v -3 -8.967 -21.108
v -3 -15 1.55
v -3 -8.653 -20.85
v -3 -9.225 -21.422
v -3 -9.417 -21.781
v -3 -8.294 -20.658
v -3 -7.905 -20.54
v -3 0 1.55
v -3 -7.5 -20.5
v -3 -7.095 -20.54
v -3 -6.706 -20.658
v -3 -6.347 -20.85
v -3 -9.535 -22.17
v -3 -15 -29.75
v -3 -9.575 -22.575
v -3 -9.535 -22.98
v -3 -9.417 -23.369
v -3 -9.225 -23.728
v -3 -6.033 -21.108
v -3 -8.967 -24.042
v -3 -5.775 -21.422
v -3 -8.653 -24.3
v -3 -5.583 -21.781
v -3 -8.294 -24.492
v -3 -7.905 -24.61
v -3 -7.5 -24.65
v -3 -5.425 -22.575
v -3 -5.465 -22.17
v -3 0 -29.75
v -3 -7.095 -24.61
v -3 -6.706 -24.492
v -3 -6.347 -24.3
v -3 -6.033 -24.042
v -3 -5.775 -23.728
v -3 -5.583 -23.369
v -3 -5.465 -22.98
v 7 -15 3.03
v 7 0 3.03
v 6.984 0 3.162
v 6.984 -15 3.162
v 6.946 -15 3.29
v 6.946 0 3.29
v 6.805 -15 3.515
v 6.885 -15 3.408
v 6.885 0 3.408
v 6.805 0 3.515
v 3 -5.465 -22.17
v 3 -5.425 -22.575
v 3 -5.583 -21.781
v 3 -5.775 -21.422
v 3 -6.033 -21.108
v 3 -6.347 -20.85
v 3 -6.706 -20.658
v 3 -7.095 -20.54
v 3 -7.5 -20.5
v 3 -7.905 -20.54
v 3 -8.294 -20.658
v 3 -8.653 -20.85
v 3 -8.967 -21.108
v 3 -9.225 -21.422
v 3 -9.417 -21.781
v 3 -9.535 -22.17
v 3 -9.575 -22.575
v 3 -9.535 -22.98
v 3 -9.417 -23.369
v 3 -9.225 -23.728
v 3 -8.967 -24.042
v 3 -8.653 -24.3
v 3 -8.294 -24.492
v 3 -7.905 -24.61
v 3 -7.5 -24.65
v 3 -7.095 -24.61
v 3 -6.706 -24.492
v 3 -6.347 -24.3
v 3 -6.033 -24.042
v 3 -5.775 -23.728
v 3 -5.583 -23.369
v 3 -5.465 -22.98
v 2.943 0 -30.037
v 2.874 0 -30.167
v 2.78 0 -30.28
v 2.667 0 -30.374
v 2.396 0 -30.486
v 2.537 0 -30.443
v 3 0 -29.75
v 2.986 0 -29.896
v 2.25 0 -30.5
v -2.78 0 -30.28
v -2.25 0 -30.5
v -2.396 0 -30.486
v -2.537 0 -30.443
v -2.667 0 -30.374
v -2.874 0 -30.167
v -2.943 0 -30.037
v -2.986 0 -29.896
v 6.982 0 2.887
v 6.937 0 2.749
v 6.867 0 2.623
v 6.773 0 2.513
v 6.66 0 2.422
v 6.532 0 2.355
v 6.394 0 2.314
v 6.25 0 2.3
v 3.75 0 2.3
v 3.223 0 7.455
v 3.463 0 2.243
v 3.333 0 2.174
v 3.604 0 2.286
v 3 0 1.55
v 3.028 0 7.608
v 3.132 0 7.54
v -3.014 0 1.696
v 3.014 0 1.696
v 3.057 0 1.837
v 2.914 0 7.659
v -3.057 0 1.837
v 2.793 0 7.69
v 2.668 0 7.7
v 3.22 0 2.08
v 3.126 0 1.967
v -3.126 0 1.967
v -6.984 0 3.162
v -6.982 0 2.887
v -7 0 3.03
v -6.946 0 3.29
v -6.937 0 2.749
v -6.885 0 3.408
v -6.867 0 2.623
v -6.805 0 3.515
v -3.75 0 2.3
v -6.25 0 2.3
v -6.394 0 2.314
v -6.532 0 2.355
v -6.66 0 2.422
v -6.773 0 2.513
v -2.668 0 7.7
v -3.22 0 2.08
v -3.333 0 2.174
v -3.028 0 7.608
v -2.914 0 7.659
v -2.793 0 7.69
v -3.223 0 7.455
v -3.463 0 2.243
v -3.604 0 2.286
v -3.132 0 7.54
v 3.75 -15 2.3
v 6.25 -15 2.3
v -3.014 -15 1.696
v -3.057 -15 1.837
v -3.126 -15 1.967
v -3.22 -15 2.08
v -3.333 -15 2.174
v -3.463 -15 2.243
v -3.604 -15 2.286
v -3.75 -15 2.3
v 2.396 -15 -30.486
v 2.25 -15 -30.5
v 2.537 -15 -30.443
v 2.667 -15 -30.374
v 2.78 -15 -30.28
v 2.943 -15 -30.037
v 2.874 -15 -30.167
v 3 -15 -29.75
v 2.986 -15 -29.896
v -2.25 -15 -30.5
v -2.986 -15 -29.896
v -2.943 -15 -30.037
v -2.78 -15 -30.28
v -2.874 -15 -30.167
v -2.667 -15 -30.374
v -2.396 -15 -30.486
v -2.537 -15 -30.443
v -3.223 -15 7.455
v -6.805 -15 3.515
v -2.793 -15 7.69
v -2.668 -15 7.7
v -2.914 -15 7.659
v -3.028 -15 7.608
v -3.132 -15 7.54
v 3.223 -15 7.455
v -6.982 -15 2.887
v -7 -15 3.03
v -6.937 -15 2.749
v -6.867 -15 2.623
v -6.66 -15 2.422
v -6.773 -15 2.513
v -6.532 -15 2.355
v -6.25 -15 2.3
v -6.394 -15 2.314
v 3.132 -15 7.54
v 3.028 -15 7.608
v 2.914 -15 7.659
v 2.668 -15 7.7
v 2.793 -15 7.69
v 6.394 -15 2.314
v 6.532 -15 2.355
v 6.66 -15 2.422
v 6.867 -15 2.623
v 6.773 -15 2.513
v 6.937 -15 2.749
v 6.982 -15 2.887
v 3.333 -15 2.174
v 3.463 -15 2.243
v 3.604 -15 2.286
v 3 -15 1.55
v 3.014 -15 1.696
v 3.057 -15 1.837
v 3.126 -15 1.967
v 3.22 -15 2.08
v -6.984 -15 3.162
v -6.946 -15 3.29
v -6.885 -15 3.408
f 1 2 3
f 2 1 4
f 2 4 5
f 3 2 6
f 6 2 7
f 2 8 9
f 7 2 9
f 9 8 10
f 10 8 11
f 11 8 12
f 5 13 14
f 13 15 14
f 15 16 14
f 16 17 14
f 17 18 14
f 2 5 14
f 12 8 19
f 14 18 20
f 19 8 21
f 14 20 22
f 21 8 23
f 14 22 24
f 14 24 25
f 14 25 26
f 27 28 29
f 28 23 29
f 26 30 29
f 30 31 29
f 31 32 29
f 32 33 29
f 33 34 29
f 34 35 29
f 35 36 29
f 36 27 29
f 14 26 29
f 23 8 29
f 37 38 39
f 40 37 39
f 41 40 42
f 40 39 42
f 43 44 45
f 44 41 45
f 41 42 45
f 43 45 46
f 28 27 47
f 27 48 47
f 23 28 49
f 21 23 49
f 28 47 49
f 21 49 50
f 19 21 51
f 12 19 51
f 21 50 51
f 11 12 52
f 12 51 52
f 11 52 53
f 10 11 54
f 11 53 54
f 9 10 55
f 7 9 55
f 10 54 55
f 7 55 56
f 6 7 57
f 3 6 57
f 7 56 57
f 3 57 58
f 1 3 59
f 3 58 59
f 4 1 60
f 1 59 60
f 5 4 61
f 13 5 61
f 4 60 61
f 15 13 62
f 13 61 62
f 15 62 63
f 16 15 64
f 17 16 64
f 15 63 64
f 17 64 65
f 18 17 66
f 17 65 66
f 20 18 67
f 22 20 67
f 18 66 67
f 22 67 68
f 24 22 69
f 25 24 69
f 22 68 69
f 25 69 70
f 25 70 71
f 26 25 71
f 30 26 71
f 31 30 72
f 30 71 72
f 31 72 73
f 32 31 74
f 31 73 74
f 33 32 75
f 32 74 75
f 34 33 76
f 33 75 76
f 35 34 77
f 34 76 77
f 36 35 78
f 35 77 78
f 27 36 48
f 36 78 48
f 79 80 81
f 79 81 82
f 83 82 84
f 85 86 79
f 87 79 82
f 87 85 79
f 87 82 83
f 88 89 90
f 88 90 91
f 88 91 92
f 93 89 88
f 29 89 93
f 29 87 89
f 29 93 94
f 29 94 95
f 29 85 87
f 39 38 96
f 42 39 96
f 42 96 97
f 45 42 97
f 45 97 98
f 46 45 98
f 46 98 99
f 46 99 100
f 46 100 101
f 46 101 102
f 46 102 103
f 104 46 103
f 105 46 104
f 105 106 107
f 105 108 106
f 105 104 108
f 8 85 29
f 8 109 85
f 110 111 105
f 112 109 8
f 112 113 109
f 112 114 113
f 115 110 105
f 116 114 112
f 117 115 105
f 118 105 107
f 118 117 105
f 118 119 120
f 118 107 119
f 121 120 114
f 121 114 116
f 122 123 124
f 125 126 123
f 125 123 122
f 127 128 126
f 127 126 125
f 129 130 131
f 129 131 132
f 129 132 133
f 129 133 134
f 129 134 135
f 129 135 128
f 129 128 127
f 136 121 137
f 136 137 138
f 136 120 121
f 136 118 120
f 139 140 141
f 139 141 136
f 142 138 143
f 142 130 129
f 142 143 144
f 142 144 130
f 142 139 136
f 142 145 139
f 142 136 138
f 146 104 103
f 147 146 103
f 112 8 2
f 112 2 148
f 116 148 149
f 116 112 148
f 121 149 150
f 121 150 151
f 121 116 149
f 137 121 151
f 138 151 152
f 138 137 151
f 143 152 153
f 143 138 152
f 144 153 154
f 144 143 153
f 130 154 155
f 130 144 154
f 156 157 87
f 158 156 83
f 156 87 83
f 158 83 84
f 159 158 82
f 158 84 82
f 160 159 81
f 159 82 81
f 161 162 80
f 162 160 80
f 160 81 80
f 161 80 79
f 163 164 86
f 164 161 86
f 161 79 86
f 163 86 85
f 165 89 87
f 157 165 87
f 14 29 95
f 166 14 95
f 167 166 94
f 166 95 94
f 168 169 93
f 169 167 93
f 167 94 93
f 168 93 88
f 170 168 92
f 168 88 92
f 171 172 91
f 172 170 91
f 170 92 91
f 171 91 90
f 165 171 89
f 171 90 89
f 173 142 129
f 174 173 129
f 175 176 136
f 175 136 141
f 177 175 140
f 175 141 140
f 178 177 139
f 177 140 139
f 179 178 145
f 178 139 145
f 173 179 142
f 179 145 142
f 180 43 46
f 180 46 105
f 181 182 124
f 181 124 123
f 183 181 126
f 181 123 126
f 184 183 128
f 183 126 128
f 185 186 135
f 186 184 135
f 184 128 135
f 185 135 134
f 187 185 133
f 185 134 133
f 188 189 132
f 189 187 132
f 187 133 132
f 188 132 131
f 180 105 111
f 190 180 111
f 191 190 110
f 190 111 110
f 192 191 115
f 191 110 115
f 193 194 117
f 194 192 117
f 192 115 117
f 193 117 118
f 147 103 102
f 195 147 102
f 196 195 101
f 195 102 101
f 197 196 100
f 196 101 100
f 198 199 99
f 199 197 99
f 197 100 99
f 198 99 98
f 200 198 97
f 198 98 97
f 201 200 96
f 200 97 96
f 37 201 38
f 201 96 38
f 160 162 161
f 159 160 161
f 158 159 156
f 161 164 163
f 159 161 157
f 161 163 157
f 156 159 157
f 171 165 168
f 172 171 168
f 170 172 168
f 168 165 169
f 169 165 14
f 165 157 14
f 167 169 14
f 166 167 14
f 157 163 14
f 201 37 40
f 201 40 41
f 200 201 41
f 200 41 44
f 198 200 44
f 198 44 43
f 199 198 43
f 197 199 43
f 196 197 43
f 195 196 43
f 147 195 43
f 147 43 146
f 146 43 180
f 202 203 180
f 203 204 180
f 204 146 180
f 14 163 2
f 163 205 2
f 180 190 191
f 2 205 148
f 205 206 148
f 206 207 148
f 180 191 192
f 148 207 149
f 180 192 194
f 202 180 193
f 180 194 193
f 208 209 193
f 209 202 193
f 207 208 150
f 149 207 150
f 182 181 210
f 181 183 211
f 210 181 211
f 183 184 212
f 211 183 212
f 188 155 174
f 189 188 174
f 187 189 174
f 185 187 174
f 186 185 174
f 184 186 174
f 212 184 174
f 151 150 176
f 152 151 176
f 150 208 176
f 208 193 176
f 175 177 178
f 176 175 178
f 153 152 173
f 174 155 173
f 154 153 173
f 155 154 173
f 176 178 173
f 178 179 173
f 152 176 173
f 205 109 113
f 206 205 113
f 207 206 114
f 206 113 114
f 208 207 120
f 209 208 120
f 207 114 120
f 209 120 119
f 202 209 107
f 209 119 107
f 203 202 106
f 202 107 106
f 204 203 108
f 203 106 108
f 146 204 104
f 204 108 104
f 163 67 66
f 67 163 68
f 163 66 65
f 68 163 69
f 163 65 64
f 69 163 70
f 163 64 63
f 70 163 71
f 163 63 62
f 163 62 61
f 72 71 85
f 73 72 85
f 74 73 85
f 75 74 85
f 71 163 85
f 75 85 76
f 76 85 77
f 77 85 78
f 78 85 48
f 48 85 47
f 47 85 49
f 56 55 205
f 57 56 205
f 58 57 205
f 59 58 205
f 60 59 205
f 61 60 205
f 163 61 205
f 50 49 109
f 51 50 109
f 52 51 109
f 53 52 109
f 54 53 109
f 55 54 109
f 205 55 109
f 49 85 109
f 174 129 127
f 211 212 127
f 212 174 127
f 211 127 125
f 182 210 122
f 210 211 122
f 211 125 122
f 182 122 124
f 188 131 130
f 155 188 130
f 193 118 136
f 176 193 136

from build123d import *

# Parameters (mm, degrees)
F0_W        = 6
F0_H        = 20.5
F0_H_2      = 4
F0_H_3      = 6
F1_DEPTH    = 15
F2_T1_DEPTH = 15
F2_T3_DEPTH = 16.4497757802
F2_T5_DEPTH = 16.6588870729
F2_T7_DEPTH = 18.75
F3_R        = 2.075
F4_DEPTH    = 12.5


# Not quite as in the source:
# - a fillet or chamfer that OpenCascade refuses, or shapes differently, is made with other operations: its cross-section is extruded or revolved along the edge and cut away or added


with BuildPart() as f1:
    # F0 (on Front) → F1 (new body)
    with BuildSketch(Plane.XZ):
        Polygon((-3, 2.3), (-3, 0), (3, 0), (3, 2.3), (7, 2.3), (7, 3.3), (3, 7.7), (-3, 7.7), (-7, 3.3), (-7, 2.3), align=None)
        with Locations((0, -10.25)):
            Rectangle(F0_W, F0_H)
        with Locations((0, -22.5)):
            Rectangle(F0_W, F0_H_2)
        with Locations((0, -27.5)):
            Rectangle(F0_W, F0_H_3)
    extrude(amount=F1_DEPTH)

    # F2: fillet of radius 0.75 on 10 edges, made by hand

    # F2_s2 → F2_t1 (join)
    with BuildSketch(Plane.XZ):
        with BuildLine():
            ThreePointArc((-3, 1.55), (-3.2196699141, 2.0803300859), (-3.75, 2.3))
            Line((-3.75, 2.3), (-3, 2.3))
            Line((-3, 2.3), (-3, 1.55))
        make_face()
        with BuildLine():
            ThreePointArc((3, 1.55), (3.2196699141, 2.0803300859), (3.75, 2.3))
            Line((3.75, 2.3), (3, 2.3))
            Line((3, 2.3), (3, 1.55))
        make_face()
    extrude(amount=F2_T1_DEPTH)

    # F2_s4 → F2_t3 (cut)
    with BuildSketch(Plane.XZ.offset(-0.7248878901)):
        with BuildLine():
            ThreePointArc((7, 3.010044844), (6.9495413824, 3.2804923515), (6.804955055, 3.5145494394))
            Line((6.804955055, 3.5145494394), (7, 3.3))
            Line((7, 3.3), (7, 3.010044844))
        make_face()
        with BuildLine():
            ThreePointArc((-6.804955055, 3.5145494394), (-6.9495413824, 3.2804923515), (-7, 3.010044844))
            Line((-7, 3.010044844), (-7, 3.3))
            Line((-7, 3.3), (-6.804955055, 3.5145494394))
        make_face()
    extrude(amount=F2_T3_DEPTH, mode=Mode.SUBTRACT)

    # F2_s6 → F2_t5 (cut)
    with BuildSketch(Plane.XZ.offset(-0.8294435365)):
        with BuildLine():
            ThreePointArc((3.2231776405, 7.4545045955), (2.971637774, 7.6358857218), (2.6682225854, 7.7))
            Line((2.6682225854, 7.7), (3, 7.7))
            Line((3, 7.7), (3.2231776405, 7.4545045955))
        make_face()
        with BuildLine():
            ThreePointArc((-2.6682225854, 7.7), (-2.971637774, 7.6358857218), (-3.2231776405, 7.4545045955))
            Line((-3.2231776405, 7.4545045955), (-3, 7.7))
            Line((-3, 7.7), (-2.6682225854, 7.7))
        make_face()
    extrude(amount=F2_T5_DEPTH, mode=Mode.SUBTRACT)

    # F2_s8 → F2_t7 (cut)
    with BuildSketch(Plane.XZ.offset(-1.875)):
        with BuildLine():
            ThreePointArc((-7, 3.05), (-6.7803300859, 2.5196699141), (-6.25, 2.3))
            Line((-6.25, 2.3), (-7, 2.3))
            Line((-7, 2.3), (-7, 3.05))
        make_face()
        with BuildLine():
            ThreePointArc((6.25, 2.3), (6.7803300859, 2.5196699141), (7, 3.05))
            Line((7, 3.05), (7, 2.3))
            Line((7, 2.3), (6.25, 2.3))
        make_face()
        with BuildLine():
            ThreePointArc((2.25, -30.5), (2.7803300859, -30.2803300859), (3, -29.75))
            Line((3, -29.75), (3, -30.5))
            Line((3, -30.5), (2.25, -30.5))
        make_face()
        with BuildLine():
            ThreePointArc((-3, -29.75), (-2.7803300859, -30.2803300859), (-2.25, -30.5))
            Line((-2.25, -30.5), (-3, -30.5))
            Line((-3, -30.5), (-3, -29.75))
        make_face()
    extrude(amount=F2_T7_DEPTH, mode=Mode.SUBTRACT)

    # F3 (on Right) → F4 (cut, symmetric)
    with BuildSketch(Plane.YZ):
        with Locations((-7.5, -22.575)):
            Circle(F3_R)
    extrude(amount=F4_DEPTH, both=True, mode=Mode.SUBTRACT)


solid = f1.part
